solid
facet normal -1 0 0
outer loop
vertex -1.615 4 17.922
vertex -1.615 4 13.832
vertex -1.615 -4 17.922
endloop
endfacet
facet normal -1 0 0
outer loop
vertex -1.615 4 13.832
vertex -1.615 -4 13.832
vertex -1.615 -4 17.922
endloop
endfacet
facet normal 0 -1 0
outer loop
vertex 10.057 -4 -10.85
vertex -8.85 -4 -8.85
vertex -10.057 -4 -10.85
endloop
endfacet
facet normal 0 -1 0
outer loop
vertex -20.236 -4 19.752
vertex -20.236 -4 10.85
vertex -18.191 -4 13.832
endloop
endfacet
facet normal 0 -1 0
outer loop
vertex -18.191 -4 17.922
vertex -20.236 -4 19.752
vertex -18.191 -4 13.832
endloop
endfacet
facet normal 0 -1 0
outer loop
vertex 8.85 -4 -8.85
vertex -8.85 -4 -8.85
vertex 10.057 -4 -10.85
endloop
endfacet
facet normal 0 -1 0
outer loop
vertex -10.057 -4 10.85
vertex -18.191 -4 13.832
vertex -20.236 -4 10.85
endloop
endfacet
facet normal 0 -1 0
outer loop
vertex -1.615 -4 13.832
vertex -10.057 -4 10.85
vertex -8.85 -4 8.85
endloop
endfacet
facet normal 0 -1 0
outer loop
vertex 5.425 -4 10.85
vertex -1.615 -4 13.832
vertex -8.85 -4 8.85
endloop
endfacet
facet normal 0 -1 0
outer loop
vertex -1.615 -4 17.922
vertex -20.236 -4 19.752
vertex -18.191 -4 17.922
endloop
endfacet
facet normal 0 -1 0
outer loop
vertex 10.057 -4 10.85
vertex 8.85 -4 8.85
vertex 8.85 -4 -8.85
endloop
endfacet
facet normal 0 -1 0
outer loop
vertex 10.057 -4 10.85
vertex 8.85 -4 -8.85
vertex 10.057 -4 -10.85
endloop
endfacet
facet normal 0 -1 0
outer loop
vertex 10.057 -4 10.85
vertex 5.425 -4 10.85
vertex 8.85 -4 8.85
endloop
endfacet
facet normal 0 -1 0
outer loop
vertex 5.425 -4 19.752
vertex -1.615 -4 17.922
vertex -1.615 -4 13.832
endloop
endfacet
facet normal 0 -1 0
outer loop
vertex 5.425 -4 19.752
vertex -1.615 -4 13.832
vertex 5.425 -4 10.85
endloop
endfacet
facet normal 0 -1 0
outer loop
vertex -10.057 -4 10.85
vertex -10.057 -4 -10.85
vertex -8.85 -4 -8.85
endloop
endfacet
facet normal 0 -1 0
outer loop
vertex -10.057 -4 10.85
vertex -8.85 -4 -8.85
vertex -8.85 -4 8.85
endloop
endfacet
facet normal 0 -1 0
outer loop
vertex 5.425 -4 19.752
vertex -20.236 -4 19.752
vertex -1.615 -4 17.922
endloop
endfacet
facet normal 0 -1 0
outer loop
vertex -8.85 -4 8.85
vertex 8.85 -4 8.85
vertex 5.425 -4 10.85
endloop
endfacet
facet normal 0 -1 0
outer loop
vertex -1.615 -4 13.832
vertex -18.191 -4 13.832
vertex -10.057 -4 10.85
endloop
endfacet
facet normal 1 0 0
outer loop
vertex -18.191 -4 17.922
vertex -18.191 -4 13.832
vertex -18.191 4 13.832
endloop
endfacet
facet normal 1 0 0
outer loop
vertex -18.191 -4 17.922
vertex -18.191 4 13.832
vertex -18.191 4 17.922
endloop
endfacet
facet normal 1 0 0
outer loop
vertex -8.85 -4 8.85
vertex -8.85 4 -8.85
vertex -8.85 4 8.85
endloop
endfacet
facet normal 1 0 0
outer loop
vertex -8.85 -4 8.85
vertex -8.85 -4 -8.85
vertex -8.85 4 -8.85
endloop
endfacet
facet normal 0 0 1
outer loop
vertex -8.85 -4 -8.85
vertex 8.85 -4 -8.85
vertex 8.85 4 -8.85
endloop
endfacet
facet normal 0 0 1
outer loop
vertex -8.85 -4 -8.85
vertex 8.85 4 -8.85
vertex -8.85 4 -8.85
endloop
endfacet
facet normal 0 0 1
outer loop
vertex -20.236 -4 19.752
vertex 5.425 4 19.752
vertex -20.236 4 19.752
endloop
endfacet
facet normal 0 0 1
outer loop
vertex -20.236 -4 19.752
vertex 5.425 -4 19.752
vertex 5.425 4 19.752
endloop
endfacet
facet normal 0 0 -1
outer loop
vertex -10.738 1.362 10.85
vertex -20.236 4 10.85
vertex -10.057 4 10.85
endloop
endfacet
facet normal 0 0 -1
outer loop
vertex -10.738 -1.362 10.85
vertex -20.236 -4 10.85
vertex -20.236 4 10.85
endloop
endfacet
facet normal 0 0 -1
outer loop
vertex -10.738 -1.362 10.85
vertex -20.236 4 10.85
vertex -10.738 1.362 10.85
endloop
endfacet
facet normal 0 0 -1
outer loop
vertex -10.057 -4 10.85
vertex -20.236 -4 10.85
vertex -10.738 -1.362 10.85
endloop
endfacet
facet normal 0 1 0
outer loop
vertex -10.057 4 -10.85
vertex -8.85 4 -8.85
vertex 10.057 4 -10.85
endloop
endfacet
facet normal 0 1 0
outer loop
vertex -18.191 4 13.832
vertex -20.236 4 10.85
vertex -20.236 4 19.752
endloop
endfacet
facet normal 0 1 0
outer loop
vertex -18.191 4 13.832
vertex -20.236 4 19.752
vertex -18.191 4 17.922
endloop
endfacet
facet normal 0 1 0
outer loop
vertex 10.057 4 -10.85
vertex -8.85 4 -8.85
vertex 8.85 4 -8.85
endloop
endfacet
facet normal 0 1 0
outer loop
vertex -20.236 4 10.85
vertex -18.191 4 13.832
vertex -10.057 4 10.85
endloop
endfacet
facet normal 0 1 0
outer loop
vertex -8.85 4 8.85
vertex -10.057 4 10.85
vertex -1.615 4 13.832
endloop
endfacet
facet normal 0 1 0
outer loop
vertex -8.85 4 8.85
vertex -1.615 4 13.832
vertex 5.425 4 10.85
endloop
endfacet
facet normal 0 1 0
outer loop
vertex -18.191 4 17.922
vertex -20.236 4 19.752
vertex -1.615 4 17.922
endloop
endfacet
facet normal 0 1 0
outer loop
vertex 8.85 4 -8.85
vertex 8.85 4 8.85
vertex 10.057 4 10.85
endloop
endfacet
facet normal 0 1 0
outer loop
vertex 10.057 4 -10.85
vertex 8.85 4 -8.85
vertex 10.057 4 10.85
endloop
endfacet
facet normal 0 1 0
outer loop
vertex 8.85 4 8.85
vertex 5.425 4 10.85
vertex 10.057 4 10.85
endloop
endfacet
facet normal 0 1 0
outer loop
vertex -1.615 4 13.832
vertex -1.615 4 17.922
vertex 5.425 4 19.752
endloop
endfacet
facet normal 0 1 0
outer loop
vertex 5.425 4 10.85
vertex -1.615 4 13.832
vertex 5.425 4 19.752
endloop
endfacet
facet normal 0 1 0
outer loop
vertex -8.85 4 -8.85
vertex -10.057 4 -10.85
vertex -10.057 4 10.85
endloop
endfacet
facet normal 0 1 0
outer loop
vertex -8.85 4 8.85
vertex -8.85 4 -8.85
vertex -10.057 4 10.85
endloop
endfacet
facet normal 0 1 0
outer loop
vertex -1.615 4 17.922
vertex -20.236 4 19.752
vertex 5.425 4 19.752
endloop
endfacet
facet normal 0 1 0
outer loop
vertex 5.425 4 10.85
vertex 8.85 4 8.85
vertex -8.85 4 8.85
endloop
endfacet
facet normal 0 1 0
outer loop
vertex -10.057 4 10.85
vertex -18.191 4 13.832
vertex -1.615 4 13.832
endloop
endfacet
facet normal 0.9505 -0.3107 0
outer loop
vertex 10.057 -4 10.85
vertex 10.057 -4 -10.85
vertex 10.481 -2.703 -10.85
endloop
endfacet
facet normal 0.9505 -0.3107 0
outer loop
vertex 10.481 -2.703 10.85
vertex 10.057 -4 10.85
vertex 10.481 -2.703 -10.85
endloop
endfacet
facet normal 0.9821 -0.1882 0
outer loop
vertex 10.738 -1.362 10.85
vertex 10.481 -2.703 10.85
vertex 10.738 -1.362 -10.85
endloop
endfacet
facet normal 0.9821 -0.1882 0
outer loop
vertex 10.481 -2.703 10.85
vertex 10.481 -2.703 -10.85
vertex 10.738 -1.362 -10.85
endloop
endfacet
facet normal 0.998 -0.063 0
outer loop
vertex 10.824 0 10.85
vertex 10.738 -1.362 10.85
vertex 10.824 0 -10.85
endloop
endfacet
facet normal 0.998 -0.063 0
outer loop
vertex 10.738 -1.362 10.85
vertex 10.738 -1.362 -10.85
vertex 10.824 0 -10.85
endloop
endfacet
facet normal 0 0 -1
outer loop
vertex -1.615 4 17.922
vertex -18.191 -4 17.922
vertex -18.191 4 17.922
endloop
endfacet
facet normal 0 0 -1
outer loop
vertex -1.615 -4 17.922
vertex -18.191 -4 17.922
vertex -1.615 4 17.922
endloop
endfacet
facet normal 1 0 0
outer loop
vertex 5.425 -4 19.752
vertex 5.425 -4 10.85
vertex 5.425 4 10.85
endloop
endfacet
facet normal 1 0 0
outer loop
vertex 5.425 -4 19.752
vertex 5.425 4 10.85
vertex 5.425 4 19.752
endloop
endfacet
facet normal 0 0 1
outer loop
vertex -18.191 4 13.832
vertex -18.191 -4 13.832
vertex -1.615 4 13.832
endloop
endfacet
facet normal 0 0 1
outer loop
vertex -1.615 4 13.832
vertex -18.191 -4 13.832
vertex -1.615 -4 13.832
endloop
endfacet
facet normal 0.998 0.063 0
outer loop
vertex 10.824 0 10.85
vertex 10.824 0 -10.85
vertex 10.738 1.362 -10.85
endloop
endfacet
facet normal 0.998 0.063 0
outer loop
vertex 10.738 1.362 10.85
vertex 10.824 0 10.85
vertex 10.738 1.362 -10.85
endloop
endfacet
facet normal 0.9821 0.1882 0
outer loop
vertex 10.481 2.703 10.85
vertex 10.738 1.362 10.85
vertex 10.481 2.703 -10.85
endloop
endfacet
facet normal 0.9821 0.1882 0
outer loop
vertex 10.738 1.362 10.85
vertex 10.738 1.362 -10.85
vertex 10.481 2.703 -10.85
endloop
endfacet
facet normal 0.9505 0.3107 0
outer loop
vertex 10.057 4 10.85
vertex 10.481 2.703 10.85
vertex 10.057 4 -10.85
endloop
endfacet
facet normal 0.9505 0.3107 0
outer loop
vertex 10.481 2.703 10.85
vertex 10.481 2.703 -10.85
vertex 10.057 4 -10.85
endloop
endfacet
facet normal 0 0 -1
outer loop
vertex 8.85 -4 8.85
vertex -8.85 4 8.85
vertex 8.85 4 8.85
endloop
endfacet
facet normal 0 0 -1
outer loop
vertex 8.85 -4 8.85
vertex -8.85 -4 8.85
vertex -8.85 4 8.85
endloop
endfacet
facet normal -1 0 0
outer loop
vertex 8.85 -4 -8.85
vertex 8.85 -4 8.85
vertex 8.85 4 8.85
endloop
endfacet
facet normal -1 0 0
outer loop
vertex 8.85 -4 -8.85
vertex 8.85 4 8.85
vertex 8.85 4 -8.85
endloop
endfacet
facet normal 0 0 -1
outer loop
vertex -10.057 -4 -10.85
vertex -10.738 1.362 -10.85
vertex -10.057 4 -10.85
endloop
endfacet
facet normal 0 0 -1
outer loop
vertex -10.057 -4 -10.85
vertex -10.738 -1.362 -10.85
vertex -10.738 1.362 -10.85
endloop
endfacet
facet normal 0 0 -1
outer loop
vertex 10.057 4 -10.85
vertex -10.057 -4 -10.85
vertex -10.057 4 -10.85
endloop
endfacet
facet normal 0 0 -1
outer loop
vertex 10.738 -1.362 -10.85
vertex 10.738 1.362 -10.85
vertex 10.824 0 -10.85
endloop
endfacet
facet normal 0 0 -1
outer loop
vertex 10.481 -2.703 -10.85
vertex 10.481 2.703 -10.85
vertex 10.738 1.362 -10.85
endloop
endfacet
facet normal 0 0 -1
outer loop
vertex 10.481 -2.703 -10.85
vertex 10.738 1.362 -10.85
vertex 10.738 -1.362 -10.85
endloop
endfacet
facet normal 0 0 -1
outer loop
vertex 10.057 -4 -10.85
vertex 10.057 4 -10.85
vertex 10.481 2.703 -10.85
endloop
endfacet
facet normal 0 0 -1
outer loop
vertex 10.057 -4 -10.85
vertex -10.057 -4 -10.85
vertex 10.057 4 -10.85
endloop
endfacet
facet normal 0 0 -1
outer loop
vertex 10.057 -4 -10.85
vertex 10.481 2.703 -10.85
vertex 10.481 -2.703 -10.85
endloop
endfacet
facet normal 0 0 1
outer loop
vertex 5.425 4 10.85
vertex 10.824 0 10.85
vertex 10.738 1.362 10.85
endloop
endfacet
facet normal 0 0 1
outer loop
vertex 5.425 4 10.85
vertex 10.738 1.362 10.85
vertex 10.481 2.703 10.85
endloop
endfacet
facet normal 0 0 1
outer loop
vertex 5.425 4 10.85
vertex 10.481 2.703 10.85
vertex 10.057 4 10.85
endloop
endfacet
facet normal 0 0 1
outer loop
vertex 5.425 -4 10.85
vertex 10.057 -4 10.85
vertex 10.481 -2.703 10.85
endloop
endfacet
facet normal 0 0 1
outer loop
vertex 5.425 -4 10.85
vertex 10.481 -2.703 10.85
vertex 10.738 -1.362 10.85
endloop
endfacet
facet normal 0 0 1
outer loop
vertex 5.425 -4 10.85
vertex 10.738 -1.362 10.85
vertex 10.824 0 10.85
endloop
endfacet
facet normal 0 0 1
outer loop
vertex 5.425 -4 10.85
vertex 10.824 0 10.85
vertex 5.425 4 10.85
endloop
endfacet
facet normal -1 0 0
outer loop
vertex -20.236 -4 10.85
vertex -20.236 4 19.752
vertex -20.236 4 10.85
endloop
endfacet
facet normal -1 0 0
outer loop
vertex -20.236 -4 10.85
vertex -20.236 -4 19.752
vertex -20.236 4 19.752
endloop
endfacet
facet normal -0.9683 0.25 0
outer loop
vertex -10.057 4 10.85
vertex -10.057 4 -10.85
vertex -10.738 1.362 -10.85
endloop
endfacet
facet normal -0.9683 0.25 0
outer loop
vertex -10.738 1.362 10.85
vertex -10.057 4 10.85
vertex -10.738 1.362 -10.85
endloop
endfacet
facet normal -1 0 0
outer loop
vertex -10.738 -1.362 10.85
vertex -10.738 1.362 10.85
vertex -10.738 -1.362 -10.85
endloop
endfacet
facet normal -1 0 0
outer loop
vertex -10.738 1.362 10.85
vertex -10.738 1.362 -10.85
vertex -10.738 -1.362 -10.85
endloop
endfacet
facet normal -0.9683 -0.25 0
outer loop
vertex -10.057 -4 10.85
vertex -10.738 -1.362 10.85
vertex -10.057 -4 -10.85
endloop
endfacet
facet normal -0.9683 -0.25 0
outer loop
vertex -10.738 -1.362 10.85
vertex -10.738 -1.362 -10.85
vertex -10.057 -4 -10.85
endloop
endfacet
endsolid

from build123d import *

# Parameters (mm, degrees)
F0_W          = 16.5766410064
F0_H          = 4.0903398767
F1_DEPTH      = 4
F1_DEPTH_BACK = 4
F3_DEPTH      = 21.7


with BuildPart() as f1:
    # F0 (on Front) → F1 (new body, two sides)
    with BuildSketch(Plane.XZ) as f1_sk:
        Polygon((-10.85, 10.85), (-10.85, 0), (-10.85, -10.85), (0, -10.85), (10.85, -10.85), (10.85, 0), (10.85, 10.85), (5.425, 10.85), (0, 10.85), align=None)
        Polygon((8.85, 8.85), (8.85, 0), (8.85, -8.85), (0, -8.85), (-8.85, -8.85), (-8.85, 0), (-8.85, 8.85), (0, 8.85), align=None, mode=Mode.SUBTRACT)
        Polygon((-20.2364195138, 10.85), (-10.85, 10.85), (0, 10.85), (5.425, 10.85), (5.425, 19.7520367801), (-20.2364195138, 19.7520367801), align=None)
        with Locations((-9.9029276753, 15.8769781701)):
            Rectangle(F0_W, F0_H, mode=Mode.SUBTRACT)
    extrude(amount=F1_DEPTH)
    extrude(f1_sk.sketch, amount=-F1_DEPTH_BACK)

    # F2 (on face) → F3 (cut)
    with BuildSketch(Plane(origin=(0, 0, -10.85), x_dir=(1, 0, 0), z_dir=(0, 0, -1))):
        with BuildLine():
            Line((13.9217844345, 4.8126999282), (9.694906495, 4.8126999282))
            ThreePointArc((9.694906495, 4.8126999282), (9.8845588749, 4.4100780486), (10.0574993187, 4))
            Line((10.0574993187, 4), (10.85, 4))
            Line((10.85, 4), (10.85, -4))
            Line((10.85, -4), (10.0574993187, -4))
            ThreePointArc((10.0574993187, -4), (9.8311449192, -4.52790041), (9.5771050518, -5.0430498086))
            Line((9.5771050518, -5.0430498086), (13.9217844345, -5.0430498086))
            Line((13.9217844345, -5.0430498086), (13.9217844345, 4.8126999282))
        make_face()
        with BuildLine():
            Line((10.85, 4), (10.0574993187, 4))
            ThreePointArc((10.0574993187, 4), (10.6304521223, 2.0363644618), (10.8237374574, 0))
            ThreePointArc((10.8237374574, 0), (10.6304521223, -2.0363644618), (10.0574993187, -4))
            Line((10.0574993187, -4), (10.85, -4))
            Line((10.85, -4), (10.85, 4))
        make_face()
        with BuildLine():
            ThreePointArc((-10.0574993187, -4), (-10.8237374574, 0), (-10.0574993187, 4))
            Line((-10.0574993187, 4), (-10.85, 4))
            Line((-10.85, 4), (-10.85, -4))
            Line((-10.85, -4), (-10.0574993187, -4))
        make_face()
    extrude(amount=-F3_DEPTH, mode=Mode.SUBTRACT)


solid = f1.part
